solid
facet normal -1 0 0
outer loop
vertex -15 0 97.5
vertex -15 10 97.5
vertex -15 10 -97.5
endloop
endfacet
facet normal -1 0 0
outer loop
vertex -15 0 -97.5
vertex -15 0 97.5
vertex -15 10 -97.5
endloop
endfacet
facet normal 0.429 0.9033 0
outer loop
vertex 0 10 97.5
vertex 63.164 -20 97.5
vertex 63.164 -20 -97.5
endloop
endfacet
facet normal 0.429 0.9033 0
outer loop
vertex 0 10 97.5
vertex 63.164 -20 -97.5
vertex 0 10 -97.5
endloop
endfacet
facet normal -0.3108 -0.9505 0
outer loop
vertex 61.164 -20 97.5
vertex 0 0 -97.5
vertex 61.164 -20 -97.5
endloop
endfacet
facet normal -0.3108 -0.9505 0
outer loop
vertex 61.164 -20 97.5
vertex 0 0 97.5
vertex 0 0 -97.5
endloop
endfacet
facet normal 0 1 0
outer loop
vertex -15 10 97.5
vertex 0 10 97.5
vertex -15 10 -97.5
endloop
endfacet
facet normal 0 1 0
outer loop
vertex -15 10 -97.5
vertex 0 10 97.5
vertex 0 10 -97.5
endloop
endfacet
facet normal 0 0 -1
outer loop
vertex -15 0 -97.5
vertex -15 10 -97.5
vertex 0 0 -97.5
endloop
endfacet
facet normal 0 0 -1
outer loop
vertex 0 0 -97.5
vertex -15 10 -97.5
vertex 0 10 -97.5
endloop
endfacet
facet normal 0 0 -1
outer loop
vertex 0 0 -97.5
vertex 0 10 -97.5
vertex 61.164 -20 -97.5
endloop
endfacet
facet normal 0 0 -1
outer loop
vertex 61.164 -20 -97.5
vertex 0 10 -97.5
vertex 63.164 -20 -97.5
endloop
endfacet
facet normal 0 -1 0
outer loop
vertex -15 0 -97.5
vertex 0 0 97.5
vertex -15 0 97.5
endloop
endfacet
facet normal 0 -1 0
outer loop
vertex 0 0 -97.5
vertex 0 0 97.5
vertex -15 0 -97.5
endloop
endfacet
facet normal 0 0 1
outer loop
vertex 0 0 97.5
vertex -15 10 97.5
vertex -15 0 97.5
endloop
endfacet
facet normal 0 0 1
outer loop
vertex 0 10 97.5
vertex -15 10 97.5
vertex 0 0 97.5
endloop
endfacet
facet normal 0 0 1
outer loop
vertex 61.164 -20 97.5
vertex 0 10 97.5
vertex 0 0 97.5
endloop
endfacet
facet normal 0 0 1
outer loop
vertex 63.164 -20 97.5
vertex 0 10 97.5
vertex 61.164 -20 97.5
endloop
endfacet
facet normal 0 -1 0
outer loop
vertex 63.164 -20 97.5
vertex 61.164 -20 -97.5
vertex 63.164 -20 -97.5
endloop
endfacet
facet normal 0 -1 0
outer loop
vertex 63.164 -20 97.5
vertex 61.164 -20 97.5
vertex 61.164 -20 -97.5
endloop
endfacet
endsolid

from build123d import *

# Parameters (mm, degrees)
SKETCH3_W           = 195
SKETCH3_H           = 10
BOSS_EXTRUDE1_DEPTH = 15
BOSS_EXTRUDE2_DEPTH = 97.5


with BuildPart() as part:
    # Sketch3 → Boss-Extrude1 (new body)
    with BuildSketch(Plane(origin=(0, 0, 0), x_dir=(0, 0, -1), z_dir=(1, 0, 0))):
        with Locations((0, 5)):
            Rectangle(SKETCH3_W, SKETCH3_H)
    extrude(amount=-BOSS_EXTRUDE1_DEPTH)

    # Sketch4 → Boss-Extrude2 (add, symmetric)
    with BuildSketch(Plane.XY):
        Polygon((61.163603665, -20), (63.163603665, -20), (0, 10), (0, 0), align=None)
    extrude(amount=BOSS_EXTRUDE2_DEPTH, both=True)


solid = part.part
